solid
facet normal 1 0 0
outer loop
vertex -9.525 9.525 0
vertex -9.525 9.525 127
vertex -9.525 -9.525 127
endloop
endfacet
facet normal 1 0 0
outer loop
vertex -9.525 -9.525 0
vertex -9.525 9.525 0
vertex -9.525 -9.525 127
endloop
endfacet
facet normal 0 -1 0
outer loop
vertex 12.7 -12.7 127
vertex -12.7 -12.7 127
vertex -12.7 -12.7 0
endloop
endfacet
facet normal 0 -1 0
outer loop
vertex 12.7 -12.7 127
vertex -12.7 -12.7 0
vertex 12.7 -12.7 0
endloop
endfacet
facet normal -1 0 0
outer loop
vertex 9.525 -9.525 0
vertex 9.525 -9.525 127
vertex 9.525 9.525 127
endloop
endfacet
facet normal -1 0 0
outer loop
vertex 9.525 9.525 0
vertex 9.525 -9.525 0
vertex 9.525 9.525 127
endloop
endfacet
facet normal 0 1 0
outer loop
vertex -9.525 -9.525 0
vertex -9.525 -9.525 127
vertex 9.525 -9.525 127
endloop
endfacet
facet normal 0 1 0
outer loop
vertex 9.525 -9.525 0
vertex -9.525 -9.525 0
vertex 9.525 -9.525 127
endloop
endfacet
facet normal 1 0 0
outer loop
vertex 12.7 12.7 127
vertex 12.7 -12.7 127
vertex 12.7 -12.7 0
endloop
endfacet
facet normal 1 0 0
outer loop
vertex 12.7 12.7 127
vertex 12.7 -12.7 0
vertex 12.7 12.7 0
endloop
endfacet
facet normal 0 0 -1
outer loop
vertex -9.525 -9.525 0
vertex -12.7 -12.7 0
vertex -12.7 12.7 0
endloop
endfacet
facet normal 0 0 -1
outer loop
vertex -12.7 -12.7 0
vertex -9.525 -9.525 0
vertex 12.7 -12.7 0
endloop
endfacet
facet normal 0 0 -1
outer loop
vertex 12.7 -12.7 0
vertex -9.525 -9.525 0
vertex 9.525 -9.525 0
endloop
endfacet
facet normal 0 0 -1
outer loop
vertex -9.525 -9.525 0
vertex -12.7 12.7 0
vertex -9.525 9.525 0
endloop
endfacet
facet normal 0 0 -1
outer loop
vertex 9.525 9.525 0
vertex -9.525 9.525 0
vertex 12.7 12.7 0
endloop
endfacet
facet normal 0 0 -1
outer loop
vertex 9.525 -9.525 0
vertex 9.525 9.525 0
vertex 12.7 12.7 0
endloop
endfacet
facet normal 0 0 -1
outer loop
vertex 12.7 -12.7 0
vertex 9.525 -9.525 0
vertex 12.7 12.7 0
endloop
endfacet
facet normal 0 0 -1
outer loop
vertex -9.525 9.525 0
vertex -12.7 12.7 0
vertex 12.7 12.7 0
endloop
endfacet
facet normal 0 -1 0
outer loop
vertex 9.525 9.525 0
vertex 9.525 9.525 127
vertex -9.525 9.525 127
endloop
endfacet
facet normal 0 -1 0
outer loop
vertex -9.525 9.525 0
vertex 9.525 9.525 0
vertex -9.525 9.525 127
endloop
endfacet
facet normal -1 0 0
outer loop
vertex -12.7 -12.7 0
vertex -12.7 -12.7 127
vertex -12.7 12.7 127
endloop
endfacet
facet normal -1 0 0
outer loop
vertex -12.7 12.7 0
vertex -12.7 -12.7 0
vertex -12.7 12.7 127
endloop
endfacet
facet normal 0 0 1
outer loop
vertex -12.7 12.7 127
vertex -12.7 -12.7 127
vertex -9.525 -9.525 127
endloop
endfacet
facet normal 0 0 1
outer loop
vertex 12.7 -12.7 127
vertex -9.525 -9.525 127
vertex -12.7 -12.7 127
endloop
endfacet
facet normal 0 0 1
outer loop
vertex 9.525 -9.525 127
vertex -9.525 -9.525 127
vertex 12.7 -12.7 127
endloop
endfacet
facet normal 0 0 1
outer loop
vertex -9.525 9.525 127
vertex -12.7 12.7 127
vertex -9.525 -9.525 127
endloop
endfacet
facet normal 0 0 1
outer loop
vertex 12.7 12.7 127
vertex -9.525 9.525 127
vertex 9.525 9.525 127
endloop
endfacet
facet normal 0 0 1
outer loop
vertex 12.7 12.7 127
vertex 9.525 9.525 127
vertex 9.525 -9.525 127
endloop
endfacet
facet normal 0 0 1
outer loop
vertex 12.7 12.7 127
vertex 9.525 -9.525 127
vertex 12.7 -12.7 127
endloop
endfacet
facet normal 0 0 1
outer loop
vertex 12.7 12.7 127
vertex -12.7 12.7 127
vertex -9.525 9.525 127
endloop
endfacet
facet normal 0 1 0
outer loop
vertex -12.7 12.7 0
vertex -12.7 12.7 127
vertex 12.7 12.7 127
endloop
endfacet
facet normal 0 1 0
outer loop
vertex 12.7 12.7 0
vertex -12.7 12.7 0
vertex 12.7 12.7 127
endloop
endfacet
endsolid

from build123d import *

# Parameters (mm, degrees)
SKETCH1_W           = 25.4
SKETCH1_H           = 25.4
BOSS_EXTRUDE1_DEPTH = 127
CUT_EXTRUDE1_DEPTH  = 127


with BuildPart() as part:
    # Sketch1 → Boss-Extrude1 (new body)
    with BuildSketch(Plane.XY):
        Rectangle(SKETCH1_W, SKETCH1_H)
    extrude(amount=BOSS_EXTRUDE1_DEPTH)

    # 3DSketch1 → Cut-Extrude1 (cut)
    with BuildSketch(Plane(origin=(-9.525, -9.525, 127), x_dir=(0.7071067811865475, 0.7071067811865476, 0), z_dir=(0, 0, -1))):
        Polygon((0, 0), (13.470384182, 13.470384182), (26.940768363, 0), (13.470384182, -13.470384182), align=None)
    extrude(amount=CUT_EXTRUDE1_DEPTH, mode=Mode.SUBTRACT)


solid = part.part
